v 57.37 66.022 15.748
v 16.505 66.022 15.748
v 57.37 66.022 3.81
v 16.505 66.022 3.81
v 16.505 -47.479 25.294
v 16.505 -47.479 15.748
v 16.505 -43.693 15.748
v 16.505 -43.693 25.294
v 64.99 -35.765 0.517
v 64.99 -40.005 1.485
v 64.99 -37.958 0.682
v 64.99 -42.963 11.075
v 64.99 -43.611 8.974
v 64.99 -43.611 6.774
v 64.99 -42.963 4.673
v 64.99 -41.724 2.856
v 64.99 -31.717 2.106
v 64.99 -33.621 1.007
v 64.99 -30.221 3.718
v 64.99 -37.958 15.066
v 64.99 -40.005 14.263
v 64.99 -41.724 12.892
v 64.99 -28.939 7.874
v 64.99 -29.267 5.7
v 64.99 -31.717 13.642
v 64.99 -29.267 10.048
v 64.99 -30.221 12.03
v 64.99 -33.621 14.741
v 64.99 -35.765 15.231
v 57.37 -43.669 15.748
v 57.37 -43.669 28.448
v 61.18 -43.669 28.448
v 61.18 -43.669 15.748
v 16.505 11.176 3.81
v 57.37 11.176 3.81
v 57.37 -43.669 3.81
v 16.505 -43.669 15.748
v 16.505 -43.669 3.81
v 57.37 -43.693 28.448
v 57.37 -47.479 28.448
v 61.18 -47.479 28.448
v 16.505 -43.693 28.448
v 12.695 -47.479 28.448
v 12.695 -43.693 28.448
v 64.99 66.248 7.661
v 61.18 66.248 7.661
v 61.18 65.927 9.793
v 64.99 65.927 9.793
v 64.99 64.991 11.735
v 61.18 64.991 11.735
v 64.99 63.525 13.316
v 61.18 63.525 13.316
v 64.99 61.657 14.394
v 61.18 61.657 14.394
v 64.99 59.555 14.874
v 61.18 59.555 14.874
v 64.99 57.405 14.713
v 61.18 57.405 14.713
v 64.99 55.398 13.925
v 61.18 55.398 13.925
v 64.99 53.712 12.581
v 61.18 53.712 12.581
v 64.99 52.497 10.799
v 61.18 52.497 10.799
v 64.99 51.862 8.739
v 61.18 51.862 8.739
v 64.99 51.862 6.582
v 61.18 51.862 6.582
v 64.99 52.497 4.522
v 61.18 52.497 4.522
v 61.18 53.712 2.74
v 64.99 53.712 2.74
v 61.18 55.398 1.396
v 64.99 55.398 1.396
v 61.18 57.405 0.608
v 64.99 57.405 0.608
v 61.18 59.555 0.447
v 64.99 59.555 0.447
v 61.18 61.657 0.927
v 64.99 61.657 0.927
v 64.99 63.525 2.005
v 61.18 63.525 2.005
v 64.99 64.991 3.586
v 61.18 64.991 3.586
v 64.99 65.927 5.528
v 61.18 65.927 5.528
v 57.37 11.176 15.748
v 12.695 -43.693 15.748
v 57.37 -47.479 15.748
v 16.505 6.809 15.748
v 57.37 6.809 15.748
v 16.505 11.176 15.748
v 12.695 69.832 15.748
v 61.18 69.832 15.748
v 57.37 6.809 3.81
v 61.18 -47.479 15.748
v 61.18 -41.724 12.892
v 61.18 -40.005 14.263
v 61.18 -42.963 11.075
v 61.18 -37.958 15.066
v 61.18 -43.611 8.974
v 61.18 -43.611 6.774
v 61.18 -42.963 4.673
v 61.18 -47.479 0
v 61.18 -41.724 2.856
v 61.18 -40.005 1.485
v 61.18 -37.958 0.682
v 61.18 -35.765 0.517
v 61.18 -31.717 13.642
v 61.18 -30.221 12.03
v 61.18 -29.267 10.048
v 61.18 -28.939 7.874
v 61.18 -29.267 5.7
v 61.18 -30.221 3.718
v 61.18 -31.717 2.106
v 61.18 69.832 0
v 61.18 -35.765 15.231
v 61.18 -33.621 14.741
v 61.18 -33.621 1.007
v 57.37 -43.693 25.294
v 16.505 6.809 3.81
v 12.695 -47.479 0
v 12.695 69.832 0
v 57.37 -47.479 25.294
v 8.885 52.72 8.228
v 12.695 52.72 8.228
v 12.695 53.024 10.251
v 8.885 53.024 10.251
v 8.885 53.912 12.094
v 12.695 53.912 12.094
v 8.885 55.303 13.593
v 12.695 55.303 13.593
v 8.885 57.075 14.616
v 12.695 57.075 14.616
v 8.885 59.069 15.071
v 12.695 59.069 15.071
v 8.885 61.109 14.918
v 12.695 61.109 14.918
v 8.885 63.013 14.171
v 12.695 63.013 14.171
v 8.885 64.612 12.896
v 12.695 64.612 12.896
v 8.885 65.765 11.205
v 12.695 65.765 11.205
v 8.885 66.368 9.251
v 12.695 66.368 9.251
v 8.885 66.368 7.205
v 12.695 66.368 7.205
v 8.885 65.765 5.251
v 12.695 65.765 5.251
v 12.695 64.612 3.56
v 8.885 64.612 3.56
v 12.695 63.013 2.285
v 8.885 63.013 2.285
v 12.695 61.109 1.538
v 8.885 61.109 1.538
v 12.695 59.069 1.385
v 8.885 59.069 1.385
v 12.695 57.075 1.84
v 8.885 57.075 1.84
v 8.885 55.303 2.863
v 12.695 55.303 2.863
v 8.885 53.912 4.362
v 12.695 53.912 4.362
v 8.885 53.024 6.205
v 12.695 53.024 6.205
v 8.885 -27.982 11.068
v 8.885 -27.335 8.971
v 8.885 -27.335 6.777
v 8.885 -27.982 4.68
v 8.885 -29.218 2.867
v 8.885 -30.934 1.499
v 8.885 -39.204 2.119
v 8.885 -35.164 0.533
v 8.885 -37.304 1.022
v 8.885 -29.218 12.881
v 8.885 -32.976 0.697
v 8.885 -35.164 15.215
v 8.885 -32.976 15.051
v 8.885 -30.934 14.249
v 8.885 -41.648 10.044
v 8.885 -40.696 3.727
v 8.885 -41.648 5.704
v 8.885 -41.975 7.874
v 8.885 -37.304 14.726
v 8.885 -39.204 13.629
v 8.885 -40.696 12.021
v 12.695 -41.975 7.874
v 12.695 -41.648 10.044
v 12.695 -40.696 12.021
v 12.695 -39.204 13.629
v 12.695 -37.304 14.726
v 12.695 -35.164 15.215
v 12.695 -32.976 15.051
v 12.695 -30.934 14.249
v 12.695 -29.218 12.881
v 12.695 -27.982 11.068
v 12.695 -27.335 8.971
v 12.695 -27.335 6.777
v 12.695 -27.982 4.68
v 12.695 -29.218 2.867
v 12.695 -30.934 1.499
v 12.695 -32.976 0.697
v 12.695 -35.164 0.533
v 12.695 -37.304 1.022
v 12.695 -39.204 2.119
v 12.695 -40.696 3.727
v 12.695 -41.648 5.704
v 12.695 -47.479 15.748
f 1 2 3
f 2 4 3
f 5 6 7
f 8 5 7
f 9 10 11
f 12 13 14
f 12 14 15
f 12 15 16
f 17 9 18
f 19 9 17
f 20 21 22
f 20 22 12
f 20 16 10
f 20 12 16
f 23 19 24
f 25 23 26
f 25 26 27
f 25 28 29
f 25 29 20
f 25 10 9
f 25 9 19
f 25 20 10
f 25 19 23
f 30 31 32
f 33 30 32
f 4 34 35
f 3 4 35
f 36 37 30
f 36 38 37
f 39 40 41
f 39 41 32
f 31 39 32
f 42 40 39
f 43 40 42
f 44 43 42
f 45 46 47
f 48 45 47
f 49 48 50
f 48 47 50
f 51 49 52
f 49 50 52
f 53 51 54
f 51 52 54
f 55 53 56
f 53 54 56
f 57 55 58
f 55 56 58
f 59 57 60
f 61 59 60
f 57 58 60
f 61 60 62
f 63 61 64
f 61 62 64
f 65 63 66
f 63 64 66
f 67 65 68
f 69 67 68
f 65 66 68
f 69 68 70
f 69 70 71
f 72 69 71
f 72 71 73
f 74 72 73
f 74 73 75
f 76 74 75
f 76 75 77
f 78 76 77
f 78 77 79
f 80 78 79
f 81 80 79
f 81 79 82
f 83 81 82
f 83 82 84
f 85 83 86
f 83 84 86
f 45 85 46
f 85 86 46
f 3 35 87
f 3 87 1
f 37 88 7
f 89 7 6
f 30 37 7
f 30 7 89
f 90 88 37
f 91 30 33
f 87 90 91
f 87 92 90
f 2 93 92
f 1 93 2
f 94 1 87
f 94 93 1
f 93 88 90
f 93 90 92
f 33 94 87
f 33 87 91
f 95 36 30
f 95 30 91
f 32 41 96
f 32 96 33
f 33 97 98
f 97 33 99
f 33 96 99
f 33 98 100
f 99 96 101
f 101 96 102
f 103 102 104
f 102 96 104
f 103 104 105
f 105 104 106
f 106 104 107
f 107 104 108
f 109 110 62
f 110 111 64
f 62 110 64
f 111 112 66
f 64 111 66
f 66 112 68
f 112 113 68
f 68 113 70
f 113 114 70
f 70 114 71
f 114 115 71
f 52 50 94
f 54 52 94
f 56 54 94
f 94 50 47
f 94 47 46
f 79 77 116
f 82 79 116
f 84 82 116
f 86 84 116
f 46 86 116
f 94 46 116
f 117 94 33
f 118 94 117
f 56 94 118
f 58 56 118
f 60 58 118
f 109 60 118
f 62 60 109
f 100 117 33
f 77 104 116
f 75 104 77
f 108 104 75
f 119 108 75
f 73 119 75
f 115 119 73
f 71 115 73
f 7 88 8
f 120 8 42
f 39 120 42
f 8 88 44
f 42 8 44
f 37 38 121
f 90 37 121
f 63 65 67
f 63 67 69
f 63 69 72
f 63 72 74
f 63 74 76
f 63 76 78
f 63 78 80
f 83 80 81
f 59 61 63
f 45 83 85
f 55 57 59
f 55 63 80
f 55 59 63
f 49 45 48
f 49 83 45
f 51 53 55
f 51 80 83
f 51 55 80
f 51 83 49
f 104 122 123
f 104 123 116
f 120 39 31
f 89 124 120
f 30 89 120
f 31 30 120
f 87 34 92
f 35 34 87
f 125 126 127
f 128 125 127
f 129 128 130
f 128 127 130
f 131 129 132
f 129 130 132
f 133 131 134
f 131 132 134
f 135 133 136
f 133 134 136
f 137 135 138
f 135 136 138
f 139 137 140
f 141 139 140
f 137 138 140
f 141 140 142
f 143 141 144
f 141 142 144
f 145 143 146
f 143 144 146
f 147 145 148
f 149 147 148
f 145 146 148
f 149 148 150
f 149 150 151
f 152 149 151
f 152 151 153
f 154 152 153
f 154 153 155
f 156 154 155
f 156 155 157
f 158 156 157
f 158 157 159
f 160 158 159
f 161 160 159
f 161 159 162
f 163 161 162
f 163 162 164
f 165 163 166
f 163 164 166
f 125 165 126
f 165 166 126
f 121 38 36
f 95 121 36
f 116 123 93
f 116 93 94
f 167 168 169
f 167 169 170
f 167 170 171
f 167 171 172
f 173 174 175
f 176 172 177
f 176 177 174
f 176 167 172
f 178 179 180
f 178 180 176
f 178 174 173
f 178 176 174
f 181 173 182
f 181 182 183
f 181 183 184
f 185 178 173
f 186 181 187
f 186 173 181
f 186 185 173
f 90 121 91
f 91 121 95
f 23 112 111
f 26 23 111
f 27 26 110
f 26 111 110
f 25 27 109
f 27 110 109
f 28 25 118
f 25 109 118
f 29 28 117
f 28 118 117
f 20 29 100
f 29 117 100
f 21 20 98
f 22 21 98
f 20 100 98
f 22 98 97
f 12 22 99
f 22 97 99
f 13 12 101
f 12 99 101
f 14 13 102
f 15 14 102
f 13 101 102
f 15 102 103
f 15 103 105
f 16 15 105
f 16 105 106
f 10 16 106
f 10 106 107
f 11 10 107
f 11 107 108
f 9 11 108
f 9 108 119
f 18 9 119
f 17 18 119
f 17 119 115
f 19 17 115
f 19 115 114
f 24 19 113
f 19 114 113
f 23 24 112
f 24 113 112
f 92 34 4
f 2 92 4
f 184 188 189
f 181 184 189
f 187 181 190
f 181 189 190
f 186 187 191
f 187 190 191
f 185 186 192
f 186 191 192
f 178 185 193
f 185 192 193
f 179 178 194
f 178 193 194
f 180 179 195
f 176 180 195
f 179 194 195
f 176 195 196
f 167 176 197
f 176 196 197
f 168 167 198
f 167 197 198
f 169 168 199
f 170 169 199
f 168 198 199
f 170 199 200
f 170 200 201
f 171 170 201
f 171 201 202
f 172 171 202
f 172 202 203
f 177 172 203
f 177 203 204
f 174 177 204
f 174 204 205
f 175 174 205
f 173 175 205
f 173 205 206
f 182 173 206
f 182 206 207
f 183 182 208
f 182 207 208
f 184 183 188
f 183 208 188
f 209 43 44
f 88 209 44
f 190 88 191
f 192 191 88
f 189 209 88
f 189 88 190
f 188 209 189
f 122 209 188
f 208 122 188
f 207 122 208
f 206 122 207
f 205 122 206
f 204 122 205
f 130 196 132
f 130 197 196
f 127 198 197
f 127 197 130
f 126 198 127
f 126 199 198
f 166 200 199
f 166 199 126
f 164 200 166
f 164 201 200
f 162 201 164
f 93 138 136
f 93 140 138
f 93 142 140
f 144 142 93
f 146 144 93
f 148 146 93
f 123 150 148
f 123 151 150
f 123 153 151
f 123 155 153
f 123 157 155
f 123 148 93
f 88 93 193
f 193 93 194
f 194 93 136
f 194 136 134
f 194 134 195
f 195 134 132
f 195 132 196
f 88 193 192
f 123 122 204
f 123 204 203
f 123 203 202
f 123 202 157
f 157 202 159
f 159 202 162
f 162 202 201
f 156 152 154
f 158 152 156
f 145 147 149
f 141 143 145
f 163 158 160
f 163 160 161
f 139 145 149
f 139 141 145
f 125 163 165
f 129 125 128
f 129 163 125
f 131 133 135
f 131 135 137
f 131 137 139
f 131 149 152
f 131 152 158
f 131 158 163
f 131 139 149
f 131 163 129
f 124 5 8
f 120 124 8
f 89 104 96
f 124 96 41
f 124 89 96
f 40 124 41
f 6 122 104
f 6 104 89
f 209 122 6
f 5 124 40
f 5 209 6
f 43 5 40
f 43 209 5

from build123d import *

# Parameters (mm, degrees)
F0_W      = 48.4853778034
F0_H      = 117.3111051321
F1_DEPTH  = 15.748
F2_T      = -3.81
F3_R      = 7.3771432129
F5_DEPTH  = 3.81
F4_R      = 7.2335570925
F6_DEPTH  = 3.81
F8_R      = 6.8623542562
F9_DEPTH  = 3.81
F7_R      = 7.3611206635
F10_DEPTH = 3.81
F11_W     = 40.8653778034
F11_H     = 4.366859328
F12_DEPTH = 11.938
F13_W     = 3.81
F13_H     = 3.7859268486
F14_DEPTH = 12.7
F15_W     = 3.81
F15_H     = 3.81
F16_DEPTH = 12.7
F17_W     = 3.7859268486
F17_H     = 3.1537165951
F18_DEPTH = 41.91


with BuildPart() as f1:
    # F0 (on Top) → F1 (new body)
    with BuildSketch(Plane.XY):
        with Locations((36.937716417, 11.1762210727)):
            Rectangle(F0_W, F0_H)
    extrude(amount=F1_DEPTH)

    # F2
    f2_openings = [f1.faces().sort_by_distance(p)[0] for p in [
        (36.937716, 11.176221, 15.748),
    ]]
    offset(amount=F2_T, openings=f2_openings)

    # F3 (on face) → F5 (join)
    with BuildSketch(Plane.YZ.offset(61.1804053187)):
        with Locations((-36.3165959716, 7.874)):
            Circle(F3_R)
    extrude(amount=F5_DEPTH)

    # F4 (on face) → F6 (join)
    with BuildSketch(Plane.YZ.offset(61.1804053187)):
        with Locations((59.0144656599, 7.6605323702)):
            Circle(F4_R)
    extrude(amount=F6_DEPTH)

    # F8 (on face) → F9 (join)
    with BuildSketch(Plane(origin=(12.6950275153, 0, 0), x_dir=(0, -1, 0), z_dir=(-1, 0, 0))):
        with Locations((-59.5819167793, 8.227978833)):
            Circle(F8_R)
    extrude(amount=F9_DEPTH)

    # F7 (on face) → F10 (join)
    with BuildSketch(Plane(origin=(12.6950275153, 0, 0), x_dir=(0, -1, 0), z_dir=(-1, 0, 0))):
        with Locations((34.6142575145, 7.874)):
            Circle(F7_R)
    extrude(amount=F10_DEPTH)

    # F11 (on face) → F12 (join)
    with BuildSketch(Plane.XY.offset(3.81)):
        with Locations((36.937716417, 8.9927914087)):
            Rectangle(F11_W, F11_H)
    extrude(amount=F12_DEPTH)

    # F13 (on face) → F14 (join)
    with BuildSketch(Plane.XY.offset(15.748)):
        with Locations((14.6000275153, -45.5863680691)):
            Rectangle(F13_W, F13_H)
    extrude(amount=F14_DEPTH)

    # F15 (on face) → F16 (join)
    with BuildSketch(Plane.XY.offset(15.748)):
        with Locations((59.2754053187, -45.5743314934)):
            Rectangle(F15_W, F15_H)
    extrude(amount=F16_DEPTH)

    # F17 (on face) → F18 (join)
    with BuildSketch(Plane.YZ.offset(16.5050275153)):
        with Locations((-45.5863680691, 26.8711417025)):
            Rectangle(F17_W, F17_H)
    extrude(amount=F18_DEPTH)


solid = f1.part
